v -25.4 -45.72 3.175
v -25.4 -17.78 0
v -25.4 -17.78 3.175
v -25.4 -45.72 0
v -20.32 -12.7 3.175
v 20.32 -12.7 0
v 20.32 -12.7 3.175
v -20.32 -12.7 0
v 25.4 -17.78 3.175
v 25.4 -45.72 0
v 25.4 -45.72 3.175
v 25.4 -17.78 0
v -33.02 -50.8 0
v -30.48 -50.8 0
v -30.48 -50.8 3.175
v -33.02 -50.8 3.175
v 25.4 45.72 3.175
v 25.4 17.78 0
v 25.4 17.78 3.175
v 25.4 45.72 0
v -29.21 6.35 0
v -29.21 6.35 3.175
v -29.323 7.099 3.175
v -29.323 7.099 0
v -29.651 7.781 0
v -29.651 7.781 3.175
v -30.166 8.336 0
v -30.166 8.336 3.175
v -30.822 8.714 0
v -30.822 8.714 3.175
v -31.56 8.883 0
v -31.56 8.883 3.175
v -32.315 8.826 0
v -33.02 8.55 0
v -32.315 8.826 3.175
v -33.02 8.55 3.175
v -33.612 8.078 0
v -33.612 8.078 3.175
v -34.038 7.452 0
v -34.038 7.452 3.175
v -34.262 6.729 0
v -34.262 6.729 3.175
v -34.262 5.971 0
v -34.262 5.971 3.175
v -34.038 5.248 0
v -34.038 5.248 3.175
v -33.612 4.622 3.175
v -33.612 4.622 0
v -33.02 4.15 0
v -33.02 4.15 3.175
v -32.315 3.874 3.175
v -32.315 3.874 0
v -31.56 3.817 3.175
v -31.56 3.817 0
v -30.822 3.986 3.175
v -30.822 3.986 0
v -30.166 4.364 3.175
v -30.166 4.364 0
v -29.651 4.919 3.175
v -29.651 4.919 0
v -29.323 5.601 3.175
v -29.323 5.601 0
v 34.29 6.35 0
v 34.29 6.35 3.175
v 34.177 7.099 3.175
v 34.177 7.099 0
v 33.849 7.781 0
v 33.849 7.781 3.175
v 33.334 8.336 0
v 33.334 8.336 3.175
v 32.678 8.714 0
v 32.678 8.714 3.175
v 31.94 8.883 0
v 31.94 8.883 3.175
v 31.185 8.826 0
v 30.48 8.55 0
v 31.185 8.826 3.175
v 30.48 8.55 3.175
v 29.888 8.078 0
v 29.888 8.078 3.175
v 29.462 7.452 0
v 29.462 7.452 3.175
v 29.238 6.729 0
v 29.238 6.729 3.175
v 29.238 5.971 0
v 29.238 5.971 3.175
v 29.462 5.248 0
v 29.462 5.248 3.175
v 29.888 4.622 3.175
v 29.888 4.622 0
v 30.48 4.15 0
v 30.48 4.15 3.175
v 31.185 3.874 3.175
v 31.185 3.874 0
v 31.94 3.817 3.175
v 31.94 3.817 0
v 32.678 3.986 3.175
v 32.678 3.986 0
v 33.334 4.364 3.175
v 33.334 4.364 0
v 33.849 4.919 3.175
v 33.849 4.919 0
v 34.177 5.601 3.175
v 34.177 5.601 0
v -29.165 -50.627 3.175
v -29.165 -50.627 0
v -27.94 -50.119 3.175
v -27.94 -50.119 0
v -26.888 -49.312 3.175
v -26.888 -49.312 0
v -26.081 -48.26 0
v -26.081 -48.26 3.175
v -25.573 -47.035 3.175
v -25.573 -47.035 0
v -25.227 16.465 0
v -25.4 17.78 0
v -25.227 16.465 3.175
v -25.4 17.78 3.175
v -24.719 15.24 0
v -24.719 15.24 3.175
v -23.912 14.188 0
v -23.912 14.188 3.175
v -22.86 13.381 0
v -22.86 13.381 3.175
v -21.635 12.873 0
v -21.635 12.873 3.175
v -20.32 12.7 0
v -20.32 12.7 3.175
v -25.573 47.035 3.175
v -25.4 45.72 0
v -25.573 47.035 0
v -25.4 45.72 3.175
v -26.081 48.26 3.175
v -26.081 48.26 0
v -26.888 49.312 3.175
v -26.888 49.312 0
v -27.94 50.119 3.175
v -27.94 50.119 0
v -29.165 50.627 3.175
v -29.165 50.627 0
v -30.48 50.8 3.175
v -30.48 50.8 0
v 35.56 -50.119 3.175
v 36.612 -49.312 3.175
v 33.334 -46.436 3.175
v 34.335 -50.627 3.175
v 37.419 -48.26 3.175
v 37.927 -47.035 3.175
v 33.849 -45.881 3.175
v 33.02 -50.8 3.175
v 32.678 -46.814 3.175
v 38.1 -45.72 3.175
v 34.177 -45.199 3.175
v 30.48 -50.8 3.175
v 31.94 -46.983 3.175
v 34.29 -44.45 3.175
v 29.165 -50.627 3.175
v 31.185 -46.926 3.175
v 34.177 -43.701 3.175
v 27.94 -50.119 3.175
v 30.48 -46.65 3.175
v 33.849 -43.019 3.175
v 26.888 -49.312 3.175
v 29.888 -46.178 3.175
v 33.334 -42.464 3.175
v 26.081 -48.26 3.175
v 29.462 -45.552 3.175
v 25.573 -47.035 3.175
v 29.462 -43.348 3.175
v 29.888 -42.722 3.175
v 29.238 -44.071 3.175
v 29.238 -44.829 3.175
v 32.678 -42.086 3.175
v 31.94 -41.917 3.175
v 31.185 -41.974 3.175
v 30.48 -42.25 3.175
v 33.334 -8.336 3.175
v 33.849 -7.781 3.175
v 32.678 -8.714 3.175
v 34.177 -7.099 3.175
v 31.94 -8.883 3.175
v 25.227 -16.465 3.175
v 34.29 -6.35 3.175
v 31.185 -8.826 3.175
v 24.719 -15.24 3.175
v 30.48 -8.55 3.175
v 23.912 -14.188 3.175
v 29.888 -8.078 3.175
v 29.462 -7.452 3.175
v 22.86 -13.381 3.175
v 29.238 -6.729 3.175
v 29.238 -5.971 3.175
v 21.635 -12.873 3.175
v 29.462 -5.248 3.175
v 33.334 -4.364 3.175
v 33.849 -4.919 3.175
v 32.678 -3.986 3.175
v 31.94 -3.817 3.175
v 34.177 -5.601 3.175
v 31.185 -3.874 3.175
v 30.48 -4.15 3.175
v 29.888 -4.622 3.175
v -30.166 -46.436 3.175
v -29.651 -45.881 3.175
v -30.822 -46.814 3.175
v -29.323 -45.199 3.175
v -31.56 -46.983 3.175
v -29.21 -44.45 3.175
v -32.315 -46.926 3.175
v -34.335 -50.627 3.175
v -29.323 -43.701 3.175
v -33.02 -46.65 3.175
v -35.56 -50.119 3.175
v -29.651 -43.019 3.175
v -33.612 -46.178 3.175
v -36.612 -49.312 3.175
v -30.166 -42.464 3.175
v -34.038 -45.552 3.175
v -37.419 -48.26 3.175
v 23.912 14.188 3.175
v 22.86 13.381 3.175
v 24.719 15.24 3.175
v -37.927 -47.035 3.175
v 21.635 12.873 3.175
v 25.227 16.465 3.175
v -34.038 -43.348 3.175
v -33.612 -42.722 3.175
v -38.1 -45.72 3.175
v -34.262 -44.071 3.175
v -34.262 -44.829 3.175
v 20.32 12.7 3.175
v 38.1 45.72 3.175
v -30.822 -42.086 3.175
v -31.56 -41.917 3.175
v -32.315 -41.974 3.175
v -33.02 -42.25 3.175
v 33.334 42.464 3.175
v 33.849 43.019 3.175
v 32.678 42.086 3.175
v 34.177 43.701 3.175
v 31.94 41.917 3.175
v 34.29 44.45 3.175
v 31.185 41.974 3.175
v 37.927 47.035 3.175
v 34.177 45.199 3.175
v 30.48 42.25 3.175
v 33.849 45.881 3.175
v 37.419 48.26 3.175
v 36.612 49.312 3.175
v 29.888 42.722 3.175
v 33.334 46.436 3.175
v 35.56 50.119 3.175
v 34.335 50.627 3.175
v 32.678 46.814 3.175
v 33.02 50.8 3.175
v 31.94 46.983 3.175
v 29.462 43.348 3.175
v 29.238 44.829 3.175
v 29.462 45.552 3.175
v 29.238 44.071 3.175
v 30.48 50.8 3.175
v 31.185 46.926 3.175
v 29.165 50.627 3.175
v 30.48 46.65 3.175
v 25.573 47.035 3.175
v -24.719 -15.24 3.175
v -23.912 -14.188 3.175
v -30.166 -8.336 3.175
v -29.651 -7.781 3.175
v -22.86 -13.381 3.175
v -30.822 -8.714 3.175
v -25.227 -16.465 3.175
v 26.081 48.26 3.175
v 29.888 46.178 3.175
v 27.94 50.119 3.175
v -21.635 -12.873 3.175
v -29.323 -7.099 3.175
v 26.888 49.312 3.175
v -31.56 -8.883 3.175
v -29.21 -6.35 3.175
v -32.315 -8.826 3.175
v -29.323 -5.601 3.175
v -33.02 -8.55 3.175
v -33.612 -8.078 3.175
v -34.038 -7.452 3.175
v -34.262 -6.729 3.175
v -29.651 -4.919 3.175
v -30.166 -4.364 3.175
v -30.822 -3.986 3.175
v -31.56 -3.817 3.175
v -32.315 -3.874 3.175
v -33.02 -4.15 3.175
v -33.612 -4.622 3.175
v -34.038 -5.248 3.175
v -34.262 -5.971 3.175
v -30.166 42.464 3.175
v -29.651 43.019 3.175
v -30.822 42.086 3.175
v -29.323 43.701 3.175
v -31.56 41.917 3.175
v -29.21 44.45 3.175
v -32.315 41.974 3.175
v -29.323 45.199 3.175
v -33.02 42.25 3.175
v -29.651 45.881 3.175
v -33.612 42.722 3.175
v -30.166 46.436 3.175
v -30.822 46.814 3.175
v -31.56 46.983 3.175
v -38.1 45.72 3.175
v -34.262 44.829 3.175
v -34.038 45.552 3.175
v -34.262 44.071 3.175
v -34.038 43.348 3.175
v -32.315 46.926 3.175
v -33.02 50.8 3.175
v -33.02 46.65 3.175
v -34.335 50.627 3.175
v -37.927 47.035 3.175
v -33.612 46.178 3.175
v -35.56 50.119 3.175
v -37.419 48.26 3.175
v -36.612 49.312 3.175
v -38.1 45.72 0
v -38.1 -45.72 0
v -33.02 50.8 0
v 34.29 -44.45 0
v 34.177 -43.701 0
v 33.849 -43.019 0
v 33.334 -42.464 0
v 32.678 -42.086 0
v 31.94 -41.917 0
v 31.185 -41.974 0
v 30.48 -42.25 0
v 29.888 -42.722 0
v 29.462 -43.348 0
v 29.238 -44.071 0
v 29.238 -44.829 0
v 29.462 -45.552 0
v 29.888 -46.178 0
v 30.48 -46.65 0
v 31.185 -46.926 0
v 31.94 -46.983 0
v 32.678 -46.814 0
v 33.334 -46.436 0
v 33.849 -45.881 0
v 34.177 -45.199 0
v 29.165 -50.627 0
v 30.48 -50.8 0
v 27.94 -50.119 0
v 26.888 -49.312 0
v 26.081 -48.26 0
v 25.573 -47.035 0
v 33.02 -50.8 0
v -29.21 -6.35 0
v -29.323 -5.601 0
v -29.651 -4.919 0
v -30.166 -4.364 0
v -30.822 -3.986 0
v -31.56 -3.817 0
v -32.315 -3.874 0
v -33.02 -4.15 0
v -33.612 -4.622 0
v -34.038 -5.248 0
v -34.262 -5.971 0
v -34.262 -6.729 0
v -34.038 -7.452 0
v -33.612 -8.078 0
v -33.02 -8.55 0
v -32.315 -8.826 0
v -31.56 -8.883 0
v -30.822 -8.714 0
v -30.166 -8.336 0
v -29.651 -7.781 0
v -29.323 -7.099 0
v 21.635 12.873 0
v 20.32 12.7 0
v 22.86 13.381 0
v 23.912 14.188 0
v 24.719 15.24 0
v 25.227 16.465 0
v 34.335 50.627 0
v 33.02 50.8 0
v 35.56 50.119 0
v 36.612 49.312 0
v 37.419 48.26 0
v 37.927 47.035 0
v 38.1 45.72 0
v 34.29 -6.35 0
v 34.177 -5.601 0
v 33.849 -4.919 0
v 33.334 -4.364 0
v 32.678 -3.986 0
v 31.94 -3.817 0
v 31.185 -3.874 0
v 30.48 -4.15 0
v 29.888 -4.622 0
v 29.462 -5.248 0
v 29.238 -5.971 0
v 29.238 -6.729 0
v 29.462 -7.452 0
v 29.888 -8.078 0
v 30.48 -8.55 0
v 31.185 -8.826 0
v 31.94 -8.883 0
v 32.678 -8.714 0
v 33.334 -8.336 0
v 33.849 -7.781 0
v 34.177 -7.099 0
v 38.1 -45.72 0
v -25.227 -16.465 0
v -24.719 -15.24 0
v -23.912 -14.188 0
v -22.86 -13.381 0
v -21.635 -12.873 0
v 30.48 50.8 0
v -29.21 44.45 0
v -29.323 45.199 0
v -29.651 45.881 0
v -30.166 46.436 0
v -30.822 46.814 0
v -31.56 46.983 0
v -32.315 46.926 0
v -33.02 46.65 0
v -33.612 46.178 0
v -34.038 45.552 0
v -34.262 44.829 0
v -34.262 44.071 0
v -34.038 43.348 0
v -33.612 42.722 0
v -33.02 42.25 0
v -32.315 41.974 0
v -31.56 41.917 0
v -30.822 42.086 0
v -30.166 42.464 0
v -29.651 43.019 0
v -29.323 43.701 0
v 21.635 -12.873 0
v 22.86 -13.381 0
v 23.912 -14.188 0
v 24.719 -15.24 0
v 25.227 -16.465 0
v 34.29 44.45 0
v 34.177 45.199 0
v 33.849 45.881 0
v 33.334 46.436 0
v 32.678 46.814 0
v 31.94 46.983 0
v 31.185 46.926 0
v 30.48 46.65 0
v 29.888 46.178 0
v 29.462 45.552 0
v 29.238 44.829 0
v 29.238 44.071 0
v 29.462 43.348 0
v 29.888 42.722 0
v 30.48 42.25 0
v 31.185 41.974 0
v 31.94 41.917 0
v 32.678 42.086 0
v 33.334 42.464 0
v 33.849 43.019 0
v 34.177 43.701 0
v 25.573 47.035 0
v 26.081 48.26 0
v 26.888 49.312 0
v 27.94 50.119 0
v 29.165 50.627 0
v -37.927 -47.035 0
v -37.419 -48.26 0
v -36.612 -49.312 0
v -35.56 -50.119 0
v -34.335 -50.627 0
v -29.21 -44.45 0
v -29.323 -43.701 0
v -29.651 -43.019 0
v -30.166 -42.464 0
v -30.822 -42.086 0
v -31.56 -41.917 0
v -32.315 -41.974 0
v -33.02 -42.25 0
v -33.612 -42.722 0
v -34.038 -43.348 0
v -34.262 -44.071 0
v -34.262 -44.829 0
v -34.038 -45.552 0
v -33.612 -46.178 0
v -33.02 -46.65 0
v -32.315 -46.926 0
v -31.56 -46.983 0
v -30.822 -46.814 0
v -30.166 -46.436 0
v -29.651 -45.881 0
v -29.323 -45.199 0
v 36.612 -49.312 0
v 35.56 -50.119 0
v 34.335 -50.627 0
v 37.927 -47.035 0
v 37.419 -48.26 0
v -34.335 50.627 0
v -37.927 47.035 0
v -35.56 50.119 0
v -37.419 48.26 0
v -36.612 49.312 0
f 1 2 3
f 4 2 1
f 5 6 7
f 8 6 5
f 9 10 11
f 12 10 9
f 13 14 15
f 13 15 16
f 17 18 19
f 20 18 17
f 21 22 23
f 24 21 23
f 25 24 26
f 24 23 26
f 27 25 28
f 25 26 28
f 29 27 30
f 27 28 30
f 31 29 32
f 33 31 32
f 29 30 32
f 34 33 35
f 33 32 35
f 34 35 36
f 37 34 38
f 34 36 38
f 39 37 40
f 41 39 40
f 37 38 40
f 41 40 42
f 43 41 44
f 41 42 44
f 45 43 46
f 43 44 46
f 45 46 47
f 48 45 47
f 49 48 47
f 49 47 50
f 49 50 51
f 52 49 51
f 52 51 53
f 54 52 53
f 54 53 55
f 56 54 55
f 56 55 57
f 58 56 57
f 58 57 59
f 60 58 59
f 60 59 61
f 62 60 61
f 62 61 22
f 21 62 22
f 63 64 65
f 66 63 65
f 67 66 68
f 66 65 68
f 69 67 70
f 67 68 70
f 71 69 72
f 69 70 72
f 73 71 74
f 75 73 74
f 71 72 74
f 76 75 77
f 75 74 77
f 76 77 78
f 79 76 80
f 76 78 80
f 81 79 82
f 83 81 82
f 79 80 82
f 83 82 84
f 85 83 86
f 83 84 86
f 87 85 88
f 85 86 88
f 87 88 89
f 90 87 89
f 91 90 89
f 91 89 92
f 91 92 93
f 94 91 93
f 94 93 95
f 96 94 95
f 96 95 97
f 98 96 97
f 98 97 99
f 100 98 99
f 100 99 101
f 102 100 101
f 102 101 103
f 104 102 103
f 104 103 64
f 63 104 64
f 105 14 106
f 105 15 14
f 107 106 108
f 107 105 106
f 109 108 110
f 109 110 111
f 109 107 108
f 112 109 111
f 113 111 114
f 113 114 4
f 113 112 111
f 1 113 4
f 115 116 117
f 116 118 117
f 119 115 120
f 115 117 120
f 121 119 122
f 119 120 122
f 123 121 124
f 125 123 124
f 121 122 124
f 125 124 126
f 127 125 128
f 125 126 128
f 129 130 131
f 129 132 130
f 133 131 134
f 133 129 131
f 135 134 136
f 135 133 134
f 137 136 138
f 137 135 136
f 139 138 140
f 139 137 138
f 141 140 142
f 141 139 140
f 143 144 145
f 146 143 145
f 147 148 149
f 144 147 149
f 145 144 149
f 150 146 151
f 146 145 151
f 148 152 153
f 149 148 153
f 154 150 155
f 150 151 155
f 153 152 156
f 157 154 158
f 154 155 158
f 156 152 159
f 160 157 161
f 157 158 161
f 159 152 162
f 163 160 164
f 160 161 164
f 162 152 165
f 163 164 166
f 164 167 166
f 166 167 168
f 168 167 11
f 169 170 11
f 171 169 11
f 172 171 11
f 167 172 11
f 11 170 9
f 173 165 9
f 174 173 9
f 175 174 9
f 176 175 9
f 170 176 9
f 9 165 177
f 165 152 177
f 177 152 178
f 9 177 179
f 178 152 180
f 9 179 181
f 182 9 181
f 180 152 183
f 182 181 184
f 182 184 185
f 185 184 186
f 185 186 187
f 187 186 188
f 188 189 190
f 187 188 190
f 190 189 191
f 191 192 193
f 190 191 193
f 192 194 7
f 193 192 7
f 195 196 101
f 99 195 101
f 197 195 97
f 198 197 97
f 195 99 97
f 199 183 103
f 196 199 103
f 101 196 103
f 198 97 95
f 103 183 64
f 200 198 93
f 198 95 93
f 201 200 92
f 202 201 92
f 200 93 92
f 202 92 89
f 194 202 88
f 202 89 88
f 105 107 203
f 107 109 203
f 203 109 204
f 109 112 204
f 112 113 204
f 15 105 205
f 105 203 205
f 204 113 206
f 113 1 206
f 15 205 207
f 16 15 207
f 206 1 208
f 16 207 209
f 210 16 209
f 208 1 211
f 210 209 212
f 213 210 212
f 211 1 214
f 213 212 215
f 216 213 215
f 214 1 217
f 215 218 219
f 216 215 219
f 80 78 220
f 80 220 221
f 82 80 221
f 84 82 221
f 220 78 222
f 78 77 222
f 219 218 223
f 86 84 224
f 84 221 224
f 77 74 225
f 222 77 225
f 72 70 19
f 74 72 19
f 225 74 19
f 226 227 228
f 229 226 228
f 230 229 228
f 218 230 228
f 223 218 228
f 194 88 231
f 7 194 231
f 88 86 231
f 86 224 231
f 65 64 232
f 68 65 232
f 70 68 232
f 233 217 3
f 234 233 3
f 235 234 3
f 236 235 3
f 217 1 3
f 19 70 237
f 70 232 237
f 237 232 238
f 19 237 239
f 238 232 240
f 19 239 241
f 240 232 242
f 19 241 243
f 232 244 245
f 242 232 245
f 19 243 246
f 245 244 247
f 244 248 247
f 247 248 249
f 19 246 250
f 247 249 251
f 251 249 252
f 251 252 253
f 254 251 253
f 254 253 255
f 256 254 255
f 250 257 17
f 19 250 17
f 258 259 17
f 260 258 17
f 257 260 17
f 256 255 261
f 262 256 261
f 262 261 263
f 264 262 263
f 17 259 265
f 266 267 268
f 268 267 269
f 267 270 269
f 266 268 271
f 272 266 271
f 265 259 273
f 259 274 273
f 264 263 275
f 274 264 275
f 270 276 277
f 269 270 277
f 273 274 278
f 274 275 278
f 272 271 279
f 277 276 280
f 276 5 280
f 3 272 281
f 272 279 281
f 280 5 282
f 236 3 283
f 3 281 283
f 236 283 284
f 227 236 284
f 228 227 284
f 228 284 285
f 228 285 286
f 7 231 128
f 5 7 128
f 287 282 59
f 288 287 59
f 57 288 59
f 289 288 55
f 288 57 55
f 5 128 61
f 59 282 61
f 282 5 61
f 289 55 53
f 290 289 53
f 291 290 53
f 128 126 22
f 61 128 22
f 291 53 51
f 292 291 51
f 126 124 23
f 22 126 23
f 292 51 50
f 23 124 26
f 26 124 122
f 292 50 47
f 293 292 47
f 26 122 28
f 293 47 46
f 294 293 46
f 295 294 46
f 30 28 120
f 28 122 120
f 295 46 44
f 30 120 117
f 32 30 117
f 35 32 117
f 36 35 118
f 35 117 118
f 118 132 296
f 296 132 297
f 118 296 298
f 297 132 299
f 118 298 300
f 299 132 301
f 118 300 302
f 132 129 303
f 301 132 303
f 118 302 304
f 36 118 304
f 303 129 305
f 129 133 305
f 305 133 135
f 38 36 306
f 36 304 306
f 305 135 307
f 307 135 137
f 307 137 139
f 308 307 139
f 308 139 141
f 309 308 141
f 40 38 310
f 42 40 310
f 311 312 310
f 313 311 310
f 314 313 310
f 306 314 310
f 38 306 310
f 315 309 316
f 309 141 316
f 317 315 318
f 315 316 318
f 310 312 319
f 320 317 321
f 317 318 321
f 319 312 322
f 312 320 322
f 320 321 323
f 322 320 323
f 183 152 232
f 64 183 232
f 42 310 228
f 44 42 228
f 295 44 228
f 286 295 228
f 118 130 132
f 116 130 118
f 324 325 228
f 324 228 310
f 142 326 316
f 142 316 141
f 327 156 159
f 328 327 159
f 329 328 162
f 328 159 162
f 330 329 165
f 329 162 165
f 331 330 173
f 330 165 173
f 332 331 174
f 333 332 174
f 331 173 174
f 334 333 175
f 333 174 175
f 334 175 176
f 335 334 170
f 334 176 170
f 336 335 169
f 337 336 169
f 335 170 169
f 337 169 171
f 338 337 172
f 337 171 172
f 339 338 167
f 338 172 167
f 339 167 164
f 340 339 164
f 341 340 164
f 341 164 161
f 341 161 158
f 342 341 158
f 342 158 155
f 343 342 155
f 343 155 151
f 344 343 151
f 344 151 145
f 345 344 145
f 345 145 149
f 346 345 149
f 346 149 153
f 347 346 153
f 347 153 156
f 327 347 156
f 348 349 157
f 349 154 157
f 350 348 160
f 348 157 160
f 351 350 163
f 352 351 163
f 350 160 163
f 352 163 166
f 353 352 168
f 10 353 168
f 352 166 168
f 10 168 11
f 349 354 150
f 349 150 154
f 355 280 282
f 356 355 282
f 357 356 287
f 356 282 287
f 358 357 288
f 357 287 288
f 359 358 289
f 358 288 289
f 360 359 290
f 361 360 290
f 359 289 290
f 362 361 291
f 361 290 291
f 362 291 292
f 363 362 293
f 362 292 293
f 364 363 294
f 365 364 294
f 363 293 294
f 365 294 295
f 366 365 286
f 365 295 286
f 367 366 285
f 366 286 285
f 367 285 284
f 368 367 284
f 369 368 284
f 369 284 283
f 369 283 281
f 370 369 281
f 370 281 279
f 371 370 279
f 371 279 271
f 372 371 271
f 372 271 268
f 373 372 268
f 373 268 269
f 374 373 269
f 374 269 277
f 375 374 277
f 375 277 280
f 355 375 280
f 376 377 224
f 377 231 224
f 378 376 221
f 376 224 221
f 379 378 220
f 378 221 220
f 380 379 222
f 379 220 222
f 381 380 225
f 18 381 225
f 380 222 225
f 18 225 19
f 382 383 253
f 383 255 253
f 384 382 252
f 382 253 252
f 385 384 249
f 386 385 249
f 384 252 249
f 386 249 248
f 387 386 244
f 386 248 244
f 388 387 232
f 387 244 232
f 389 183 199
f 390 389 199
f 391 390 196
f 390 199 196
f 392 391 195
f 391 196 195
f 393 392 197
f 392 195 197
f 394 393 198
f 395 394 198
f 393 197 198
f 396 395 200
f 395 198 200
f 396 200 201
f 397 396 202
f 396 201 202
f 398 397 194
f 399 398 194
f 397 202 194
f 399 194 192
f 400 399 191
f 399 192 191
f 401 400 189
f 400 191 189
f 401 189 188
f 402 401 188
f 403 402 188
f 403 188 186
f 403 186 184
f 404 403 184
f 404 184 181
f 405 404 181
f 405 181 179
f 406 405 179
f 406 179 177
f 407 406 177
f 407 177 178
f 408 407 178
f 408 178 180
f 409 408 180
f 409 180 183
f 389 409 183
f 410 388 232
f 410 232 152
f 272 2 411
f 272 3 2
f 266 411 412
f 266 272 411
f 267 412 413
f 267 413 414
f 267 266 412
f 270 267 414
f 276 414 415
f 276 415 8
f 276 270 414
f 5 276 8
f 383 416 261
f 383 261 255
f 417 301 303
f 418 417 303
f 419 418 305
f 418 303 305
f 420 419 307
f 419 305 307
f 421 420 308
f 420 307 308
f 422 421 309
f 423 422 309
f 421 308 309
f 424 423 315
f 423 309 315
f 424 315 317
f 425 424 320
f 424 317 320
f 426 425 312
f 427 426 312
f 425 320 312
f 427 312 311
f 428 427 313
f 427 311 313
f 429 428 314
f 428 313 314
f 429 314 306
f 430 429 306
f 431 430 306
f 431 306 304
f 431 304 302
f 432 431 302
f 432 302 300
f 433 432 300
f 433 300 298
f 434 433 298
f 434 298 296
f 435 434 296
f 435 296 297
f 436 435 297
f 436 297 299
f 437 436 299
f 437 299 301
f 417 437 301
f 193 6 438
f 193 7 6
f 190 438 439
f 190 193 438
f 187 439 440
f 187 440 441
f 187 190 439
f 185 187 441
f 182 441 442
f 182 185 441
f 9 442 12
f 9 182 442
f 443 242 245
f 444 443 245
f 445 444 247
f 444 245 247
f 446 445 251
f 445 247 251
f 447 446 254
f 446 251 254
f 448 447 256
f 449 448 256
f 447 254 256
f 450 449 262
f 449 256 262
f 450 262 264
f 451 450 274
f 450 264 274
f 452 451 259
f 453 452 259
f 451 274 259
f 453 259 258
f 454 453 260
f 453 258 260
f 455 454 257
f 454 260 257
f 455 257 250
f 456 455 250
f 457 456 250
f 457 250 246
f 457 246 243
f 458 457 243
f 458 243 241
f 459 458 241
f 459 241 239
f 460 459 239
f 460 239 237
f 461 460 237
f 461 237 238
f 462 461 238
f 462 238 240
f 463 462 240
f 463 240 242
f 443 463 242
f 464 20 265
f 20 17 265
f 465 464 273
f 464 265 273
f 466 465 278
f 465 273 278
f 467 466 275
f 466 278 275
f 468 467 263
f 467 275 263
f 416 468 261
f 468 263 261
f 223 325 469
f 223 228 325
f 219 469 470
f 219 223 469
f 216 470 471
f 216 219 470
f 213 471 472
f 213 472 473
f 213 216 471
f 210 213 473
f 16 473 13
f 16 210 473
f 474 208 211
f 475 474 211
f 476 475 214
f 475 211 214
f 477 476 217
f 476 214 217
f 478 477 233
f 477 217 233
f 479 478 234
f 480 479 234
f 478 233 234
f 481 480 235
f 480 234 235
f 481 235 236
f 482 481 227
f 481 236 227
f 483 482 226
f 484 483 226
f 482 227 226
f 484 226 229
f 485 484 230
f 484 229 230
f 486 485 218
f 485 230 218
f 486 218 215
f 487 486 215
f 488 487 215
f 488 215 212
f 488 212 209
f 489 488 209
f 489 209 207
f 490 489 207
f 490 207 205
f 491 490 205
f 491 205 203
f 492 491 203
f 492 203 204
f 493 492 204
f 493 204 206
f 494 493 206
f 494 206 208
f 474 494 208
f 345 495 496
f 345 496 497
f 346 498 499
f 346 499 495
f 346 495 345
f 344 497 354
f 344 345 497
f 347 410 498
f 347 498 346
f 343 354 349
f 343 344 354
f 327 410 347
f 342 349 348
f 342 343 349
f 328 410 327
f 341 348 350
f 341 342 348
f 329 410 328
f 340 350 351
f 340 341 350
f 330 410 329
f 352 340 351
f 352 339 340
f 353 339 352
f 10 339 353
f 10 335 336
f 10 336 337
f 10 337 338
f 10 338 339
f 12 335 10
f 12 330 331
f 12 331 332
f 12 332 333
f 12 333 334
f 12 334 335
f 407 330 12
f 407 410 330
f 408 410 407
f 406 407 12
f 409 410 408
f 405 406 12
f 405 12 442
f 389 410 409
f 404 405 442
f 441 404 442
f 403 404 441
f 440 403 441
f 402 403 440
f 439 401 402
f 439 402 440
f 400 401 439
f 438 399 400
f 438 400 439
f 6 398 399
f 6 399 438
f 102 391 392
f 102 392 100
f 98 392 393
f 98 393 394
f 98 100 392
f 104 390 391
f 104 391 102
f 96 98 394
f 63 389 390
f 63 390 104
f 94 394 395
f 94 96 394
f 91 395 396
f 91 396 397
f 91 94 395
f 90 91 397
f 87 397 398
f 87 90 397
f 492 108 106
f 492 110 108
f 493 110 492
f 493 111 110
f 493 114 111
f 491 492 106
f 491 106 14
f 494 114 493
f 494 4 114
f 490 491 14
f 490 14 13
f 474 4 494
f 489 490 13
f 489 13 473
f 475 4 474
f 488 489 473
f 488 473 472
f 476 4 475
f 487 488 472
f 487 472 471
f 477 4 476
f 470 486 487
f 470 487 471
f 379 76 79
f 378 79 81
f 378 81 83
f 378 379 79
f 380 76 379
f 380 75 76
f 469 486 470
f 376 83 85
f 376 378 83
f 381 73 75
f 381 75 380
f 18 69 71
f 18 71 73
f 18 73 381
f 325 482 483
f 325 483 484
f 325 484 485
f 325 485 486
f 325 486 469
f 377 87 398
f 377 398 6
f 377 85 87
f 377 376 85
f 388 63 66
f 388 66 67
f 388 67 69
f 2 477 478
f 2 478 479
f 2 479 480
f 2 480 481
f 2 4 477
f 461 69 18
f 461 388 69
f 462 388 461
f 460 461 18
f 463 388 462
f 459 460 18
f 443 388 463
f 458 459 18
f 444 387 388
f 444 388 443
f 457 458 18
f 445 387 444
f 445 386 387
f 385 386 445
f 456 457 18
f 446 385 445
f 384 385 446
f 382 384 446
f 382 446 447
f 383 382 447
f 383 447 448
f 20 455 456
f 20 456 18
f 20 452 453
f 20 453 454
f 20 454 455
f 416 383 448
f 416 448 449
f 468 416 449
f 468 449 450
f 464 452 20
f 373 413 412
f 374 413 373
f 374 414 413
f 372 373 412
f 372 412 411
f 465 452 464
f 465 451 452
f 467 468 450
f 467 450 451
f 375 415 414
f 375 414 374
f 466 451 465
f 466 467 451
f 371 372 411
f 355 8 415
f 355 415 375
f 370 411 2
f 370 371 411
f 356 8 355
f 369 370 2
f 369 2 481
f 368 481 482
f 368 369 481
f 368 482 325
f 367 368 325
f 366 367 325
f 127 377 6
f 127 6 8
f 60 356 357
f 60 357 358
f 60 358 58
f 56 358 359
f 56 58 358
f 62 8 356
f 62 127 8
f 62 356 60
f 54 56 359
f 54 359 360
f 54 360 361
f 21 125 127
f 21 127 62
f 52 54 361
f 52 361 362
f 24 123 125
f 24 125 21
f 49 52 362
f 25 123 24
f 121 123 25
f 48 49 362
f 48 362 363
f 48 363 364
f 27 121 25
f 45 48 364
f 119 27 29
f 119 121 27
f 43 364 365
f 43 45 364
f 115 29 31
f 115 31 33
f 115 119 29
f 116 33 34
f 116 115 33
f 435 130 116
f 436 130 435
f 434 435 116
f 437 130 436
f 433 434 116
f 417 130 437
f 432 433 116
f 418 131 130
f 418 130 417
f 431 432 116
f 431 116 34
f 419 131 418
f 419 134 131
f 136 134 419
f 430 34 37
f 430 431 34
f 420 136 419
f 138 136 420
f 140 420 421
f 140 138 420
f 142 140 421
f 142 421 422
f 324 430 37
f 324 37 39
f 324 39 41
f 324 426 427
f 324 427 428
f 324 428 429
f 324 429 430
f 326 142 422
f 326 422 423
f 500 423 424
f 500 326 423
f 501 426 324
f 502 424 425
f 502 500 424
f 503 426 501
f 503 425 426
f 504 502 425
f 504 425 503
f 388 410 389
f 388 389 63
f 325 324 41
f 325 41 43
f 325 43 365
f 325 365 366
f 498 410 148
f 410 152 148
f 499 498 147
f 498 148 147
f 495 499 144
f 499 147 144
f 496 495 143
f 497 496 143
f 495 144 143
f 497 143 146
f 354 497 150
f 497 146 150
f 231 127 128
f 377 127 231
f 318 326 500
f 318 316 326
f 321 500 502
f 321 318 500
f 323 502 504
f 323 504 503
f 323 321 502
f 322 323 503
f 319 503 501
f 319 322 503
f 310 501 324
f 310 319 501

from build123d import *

# Parameters (mm, degrees)
BOSS_EXTRUDE1_DEPTH = 3.175
SKETCH4_R           = 2.54
CUT_EXTRUDE3_DEPTH  = 4.175
FILLET1_R           = 5.08
FILLET2_R           = 5.08


with BuildPart() as part:
    # Sketch1 → Boss-Extrude1 (new body)
    with BuildSketch(Plane.XY):
        Polygon((-38.1, 50.8), (-25.4, 50.8), (-25.4, 12.7), (25.4, 12.7), (25.4, 50.8), (38.1, 50.8), (38.1, -50.8), (25.4, -50.8), (25.4, -12.7), (-25.4, -12.7), (-25.4, -50.8), (-38.1, -50.8), align=None)
    extrude(amount=BOSS_EXTRUDE1_DEPTH)

    # Sketch4 → Cut-Extrude3 (cut, through all)
    with BuildSketch(Plane.XY.offset(3.175)):
        with Locations((-31.75, 44.45)):
            Circle(SKETCH4_R)
        with Locations((-31.75, 6.35)):
            Circle(SKETCH4_R)
        with Locations((31.75, 6.35)):
            Circle(SKETCH4_R)
        with Locations((31.75, 44.45)):
            Circle(SKETCH4_R)
        with Locations((-31.75, -6.35)):
            Circle(SKETCH4_R)
        with Locations((31.75, -6.35)):
            Circle(SKETCH4_R)
        with Locations((31.75, -44.45)):
            Circle(SKETCH4_R)
        with Locations((-31.75, -44.45)):
            Circle(SKETCH4_R)
    extrude(amount=-CUT_EXTRUDE3_DEPTH, mode=Mode.SUBTRACT)

    # Fillet1
    fillet1_edges = [part.edges().sort_by_distance(p)[0] for p in [
        (25.4, -12.7, 1.5875),
        (-25.4, -12.7, 1.5875),
        (-25.4, 12.7, 1.5875),
        (25.4, 12.7, 1.5875),
    ]]
    fillet(fillet1_edges, radius=FILLET1_R)

    # Fillet2
    fillet2_edges = [part.edges().sort_by_distance(p)[0] for p in [
        (38.1, 50.8, 1.5875),
        (38.1, -50.8, 1.5875),
        (25.4, -50.8, 1.5875),
        (-25.4, -50.8, 1.5875),
        (-38.1, -50.8, 1.5875),
        (-38.1, 50.8, 1.5875),
        (-25.4, 50.8, 1.5875),
        (25.4, 50.8, 1.5875),
    ]]
    fillet(fillet2_edges, radius=FILLET2_R)


solid = part.part
